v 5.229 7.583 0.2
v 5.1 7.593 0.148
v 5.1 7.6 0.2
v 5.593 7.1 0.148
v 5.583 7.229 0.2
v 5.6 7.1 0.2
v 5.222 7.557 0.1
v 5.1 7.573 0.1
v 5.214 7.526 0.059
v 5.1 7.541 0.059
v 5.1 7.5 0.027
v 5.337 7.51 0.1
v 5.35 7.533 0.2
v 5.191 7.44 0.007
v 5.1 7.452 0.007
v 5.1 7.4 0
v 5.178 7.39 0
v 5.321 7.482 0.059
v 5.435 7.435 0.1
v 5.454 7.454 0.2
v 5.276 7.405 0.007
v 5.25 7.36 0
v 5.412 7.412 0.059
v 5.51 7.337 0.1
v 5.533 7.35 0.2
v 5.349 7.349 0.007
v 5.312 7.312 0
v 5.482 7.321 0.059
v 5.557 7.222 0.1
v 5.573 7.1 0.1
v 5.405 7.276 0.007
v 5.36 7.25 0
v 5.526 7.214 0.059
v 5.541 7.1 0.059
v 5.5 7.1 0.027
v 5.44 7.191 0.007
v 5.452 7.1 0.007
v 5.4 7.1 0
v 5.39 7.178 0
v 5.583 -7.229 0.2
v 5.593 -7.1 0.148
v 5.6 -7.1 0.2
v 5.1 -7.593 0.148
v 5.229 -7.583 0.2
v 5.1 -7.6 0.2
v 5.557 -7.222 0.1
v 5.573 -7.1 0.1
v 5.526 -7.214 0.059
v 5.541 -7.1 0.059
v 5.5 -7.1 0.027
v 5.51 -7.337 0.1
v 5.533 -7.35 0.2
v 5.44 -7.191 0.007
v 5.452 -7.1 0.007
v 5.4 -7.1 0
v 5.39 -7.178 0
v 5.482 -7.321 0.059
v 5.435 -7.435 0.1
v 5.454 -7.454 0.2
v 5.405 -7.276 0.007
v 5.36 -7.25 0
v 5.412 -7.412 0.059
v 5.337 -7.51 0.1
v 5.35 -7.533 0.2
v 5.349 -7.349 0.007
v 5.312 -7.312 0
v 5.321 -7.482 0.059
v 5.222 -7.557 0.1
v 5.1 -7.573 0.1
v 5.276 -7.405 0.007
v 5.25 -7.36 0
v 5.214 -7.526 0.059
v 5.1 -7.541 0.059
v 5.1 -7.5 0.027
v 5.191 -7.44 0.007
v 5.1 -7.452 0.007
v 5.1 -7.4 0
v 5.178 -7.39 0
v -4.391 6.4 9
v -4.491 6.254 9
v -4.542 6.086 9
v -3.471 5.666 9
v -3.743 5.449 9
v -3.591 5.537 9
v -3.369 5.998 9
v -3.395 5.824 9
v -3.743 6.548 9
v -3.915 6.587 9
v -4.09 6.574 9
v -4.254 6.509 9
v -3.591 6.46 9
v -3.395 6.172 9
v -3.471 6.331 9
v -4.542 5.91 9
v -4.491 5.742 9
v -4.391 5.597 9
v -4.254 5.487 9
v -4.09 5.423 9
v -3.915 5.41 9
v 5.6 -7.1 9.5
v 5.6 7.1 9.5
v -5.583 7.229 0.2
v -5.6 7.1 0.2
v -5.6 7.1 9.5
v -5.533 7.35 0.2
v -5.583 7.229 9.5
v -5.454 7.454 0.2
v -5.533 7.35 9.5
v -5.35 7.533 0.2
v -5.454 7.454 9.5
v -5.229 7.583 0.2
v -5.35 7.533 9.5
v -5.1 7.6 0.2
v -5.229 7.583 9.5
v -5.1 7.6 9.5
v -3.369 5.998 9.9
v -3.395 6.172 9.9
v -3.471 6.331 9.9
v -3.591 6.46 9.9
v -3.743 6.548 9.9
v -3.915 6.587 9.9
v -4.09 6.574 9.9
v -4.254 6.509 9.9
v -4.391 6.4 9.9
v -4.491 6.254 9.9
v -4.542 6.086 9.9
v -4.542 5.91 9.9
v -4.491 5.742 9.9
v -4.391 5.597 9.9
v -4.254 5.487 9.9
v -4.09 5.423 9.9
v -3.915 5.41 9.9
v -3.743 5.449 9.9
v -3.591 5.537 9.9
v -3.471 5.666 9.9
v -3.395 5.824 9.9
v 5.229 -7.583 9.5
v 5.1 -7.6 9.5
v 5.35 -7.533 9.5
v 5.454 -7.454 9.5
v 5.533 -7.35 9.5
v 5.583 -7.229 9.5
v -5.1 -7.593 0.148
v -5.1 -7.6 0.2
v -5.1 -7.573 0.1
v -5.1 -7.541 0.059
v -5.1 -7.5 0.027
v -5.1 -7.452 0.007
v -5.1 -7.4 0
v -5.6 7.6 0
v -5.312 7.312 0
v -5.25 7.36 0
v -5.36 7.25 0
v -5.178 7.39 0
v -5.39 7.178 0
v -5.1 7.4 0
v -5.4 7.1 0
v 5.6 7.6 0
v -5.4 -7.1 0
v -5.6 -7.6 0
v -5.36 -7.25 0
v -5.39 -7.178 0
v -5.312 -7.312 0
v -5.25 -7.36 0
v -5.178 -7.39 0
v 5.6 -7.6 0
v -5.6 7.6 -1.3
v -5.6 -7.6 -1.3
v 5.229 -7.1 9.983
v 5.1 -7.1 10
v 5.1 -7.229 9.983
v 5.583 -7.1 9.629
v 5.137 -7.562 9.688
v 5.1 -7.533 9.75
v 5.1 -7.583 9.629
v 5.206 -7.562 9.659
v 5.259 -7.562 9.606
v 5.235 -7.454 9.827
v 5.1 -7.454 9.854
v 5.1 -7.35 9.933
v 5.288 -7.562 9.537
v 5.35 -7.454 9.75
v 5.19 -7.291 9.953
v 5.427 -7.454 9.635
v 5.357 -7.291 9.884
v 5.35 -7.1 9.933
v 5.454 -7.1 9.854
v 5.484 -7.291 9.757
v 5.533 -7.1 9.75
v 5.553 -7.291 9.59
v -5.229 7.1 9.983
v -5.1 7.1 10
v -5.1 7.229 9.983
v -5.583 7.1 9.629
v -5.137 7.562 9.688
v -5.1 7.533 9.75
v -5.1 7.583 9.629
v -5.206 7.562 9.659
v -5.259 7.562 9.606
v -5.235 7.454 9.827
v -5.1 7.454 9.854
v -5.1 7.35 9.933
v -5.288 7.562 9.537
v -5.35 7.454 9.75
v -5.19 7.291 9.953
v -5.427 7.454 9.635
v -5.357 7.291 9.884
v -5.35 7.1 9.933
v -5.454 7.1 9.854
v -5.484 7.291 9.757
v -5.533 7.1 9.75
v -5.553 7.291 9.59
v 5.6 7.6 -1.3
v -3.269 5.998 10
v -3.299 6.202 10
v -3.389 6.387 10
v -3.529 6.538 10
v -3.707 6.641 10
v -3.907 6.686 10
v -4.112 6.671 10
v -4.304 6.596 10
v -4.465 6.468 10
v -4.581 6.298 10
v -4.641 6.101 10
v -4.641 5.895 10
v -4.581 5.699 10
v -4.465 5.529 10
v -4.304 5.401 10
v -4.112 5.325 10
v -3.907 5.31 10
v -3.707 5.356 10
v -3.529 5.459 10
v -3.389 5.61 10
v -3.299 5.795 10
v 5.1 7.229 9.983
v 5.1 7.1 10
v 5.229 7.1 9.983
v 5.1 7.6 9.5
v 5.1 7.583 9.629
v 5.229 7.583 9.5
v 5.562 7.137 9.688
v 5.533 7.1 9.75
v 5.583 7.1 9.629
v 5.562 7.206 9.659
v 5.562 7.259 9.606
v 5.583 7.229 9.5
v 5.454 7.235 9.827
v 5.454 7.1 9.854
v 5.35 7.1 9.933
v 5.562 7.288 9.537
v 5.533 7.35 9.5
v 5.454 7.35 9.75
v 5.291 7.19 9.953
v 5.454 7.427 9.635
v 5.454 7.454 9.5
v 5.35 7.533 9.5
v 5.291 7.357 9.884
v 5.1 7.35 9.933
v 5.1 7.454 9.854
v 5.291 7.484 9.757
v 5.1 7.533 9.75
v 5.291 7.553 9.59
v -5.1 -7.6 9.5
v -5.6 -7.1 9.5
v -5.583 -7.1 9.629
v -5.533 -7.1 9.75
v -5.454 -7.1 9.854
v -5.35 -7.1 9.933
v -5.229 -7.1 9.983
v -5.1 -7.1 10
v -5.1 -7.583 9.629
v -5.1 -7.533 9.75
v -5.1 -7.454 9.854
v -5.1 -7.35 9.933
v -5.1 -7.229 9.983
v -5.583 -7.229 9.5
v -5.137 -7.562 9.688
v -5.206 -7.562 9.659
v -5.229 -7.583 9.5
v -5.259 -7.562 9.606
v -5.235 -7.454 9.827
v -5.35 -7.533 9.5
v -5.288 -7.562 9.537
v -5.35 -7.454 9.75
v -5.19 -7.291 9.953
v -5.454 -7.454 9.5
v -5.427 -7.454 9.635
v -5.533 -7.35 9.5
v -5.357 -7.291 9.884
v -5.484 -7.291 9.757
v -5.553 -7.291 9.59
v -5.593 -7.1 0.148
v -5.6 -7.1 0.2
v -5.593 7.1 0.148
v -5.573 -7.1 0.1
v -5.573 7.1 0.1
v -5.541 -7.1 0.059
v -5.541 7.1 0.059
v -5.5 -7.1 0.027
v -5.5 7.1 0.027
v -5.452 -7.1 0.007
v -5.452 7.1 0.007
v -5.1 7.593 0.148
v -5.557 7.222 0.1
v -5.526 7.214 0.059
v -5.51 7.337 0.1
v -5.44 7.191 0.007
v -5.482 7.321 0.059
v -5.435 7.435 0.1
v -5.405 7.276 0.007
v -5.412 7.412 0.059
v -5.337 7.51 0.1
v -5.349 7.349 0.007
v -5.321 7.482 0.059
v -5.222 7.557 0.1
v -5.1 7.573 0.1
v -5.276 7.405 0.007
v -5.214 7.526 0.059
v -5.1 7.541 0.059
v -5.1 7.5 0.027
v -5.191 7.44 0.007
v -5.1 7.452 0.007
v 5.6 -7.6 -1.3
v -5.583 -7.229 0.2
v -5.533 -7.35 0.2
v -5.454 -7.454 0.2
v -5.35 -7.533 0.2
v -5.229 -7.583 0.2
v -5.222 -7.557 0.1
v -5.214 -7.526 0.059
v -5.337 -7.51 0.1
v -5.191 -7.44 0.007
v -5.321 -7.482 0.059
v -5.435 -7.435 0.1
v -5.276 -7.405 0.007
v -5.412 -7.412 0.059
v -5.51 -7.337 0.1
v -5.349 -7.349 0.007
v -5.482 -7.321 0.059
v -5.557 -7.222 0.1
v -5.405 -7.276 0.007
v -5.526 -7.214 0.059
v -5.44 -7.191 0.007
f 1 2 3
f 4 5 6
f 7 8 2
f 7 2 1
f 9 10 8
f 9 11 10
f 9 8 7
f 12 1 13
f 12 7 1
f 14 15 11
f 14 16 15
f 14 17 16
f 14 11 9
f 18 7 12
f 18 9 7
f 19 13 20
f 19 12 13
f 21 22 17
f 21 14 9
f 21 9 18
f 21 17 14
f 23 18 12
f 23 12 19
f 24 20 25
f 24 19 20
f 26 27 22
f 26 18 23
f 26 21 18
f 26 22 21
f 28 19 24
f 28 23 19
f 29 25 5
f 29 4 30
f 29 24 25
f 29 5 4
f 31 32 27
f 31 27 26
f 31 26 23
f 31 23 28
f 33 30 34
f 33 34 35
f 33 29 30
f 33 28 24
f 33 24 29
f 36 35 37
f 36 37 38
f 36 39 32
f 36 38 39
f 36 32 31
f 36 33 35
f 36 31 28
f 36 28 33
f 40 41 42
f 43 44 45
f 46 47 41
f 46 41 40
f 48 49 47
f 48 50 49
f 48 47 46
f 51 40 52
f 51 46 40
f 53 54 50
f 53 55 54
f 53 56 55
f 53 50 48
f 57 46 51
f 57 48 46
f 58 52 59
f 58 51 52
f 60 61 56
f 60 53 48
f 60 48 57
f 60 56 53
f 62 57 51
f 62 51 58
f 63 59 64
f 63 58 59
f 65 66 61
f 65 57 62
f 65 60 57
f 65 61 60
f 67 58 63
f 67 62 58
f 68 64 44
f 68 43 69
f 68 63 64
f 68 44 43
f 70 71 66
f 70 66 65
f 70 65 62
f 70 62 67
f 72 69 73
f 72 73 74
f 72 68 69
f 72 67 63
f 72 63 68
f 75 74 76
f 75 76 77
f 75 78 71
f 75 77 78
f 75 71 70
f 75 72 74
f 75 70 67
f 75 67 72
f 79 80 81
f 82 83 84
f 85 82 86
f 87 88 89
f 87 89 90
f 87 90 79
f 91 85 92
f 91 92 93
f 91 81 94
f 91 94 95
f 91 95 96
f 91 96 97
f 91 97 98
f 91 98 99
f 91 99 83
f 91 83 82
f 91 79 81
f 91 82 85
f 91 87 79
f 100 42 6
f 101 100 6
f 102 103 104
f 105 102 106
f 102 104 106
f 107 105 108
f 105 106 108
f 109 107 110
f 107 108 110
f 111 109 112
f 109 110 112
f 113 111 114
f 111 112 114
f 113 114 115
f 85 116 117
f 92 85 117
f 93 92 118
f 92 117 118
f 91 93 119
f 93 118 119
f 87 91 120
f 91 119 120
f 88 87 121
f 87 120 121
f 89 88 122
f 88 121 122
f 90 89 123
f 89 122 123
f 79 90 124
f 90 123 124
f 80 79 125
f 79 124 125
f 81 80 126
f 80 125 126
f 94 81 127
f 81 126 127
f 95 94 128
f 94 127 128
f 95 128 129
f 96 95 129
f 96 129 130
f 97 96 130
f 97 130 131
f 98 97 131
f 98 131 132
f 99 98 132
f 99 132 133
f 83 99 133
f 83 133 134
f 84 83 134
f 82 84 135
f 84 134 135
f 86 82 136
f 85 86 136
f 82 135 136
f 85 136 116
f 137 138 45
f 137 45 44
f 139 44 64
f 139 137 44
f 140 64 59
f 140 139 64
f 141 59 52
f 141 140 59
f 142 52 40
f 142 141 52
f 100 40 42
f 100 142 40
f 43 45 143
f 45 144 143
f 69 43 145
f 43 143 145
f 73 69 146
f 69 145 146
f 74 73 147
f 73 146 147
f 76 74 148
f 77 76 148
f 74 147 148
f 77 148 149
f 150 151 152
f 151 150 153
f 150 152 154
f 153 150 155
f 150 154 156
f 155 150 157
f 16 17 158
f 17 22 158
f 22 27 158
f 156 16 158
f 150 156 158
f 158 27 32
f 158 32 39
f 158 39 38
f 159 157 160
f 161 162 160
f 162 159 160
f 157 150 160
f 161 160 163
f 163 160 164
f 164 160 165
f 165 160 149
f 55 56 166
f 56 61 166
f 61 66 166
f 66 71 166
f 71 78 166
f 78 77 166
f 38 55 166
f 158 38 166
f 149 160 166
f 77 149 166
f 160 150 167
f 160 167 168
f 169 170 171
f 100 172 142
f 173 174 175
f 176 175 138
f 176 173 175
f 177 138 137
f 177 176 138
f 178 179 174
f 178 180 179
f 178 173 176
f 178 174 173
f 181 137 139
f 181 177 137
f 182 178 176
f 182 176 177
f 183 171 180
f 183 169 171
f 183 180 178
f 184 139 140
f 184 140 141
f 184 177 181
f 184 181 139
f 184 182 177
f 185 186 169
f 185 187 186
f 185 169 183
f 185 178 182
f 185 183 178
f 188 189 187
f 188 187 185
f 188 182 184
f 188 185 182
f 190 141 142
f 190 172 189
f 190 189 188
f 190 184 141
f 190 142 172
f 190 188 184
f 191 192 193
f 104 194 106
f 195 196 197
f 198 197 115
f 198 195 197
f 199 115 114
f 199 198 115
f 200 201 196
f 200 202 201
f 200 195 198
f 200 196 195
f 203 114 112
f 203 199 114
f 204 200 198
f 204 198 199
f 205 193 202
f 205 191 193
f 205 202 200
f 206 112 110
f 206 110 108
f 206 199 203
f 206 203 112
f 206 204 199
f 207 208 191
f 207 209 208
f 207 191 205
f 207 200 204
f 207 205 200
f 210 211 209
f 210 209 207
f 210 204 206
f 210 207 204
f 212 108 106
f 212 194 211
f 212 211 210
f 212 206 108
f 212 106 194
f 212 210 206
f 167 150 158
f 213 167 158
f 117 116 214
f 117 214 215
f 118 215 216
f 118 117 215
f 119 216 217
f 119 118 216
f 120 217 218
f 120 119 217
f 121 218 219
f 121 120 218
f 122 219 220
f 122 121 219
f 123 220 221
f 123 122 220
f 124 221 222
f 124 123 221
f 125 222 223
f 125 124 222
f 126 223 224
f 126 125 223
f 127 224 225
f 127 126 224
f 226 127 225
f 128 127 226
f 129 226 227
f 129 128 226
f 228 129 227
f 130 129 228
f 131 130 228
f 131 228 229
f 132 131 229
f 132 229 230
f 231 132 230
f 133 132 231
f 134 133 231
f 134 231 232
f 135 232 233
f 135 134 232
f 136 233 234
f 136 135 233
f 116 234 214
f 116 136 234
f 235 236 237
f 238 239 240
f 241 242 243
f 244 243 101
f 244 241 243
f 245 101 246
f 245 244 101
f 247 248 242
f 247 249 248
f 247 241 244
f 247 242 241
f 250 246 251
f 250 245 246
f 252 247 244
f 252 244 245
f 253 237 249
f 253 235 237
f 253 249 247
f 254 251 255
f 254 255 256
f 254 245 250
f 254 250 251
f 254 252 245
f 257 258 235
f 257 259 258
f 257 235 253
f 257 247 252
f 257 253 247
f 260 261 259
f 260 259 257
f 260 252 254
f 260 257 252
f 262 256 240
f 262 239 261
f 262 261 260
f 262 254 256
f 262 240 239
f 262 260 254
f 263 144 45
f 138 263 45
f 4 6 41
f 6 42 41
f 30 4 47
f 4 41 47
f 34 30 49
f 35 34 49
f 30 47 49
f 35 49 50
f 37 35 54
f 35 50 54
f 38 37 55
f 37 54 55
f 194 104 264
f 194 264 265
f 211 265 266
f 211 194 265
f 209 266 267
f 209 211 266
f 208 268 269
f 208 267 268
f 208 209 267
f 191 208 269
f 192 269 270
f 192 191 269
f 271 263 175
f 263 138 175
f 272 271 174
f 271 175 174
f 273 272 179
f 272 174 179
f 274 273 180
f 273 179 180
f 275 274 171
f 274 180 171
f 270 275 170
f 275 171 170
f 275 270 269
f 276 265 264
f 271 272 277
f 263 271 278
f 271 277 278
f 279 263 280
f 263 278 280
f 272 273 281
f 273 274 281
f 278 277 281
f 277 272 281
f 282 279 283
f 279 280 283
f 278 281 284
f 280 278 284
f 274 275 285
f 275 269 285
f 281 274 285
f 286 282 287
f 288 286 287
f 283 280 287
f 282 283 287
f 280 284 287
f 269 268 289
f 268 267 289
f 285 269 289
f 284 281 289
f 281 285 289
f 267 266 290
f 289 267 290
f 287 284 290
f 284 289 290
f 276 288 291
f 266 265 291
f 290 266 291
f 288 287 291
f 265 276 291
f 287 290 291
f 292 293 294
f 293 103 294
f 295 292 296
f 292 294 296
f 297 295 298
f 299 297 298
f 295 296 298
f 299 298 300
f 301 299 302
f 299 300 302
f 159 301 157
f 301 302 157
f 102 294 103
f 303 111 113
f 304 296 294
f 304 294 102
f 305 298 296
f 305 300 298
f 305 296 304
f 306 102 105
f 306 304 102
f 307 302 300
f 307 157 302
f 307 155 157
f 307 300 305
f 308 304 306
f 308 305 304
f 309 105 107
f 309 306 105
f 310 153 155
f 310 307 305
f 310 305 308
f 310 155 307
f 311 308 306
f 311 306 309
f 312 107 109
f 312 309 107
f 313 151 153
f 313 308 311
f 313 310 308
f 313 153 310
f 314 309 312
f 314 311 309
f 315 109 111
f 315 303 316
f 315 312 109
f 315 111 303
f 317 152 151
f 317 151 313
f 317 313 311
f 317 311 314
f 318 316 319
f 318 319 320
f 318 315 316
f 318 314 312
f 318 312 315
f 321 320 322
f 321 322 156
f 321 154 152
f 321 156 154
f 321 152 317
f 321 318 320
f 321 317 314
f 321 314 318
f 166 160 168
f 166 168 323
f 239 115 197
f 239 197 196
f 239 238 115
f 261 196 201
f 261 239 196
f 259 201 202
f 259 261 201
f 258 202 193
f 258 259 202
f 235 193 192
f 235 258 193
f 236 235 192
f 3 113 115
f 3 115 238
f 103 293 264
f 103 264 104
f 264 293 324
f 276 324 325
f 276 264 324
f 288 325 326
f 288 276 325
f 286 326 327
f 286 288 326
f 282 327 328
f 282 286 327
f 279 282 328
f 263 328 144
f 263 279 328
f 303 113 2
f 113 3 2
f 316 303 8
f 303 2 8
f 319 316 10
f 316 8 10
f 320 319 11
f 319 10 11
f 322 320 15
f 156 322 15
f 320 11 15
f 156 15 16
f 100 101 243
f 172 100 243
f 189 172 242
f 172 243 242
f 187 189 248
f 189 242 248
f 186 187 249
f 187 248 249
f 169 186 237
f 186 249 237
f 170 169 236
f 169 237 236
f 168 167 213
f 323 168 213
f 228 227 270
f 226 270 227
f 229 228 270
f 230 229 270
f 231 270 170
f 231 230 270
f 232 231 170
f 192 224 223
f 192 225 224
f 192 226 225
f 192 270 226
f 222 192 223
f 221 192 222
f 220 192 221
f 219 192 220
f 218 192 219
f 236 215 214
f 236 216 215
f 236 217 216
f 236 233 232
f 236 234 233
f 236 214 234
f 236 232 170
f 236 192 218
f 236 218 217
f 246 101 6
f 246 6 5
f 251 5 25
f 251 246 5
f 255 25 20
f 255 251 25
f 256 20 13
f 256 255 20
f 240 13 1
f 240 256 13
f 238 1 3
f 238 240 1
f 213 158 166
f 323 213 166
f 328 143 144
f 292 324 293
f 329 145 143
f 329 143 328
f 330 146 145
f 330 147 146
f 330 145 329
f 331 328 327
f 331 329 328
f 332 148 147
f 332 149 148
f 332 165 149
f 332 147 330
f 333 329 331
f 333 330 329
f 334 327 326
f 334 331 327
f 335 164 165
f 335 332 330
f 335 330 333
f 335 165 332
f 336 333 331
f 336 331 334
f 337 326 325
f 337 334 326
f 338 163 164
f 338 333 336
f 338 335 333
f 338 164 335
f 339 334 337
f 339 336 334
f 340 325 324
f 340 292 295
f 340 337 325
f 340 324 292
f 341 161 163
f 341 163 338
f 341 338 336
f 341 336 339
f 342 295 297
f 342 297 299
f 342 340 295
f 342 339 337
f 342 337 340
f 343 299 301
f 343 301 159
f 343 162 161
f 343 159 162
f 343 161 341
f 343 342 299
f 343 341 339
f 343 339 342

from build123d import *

# Parameters (mm, degrees)
SKETCH_W     = 11.2
SKETCH_H     = 15.2
PAD_DEPTH    = 10
FILLET_R     = 0.5
FILLET001_R  = 0.2
SKETCH002_R  = 0.590091
POCKET_DEPTH = 1
SKETCH001_W  = 11.2
SKETCH001_H  = 15.2
PAD001_DEPTH = 1.3
CHAMFER_SIZE = 0.1


with BuildPart() as part:
    # Sketch → Pad (new body)
    with BuildSketch(Plane.XY):
        Rectangle(SKETCH_W, SKETCH_H)
    extrude(amount=PAD_DEPTH)

    # Fillet
    fillet_edges = [part.edges().sort_by_distance(p)[0] for p in [
        (-5.6, 0, 10),
        (0, 7.6, 10),
        (5.6, 0, 10),
        (0, -7.6, 10),
        (5.6, -7.6, 5),
        (5.6, 7.6, 5),
        (-5.6, 7.6, 5),
        (-5.6, -7.6, 5),
    ]]
    fillet(fillet_edges, radius=FILLET_R)

    # Fillet001
    fillet001_edges = [part.edges().sort_by_distance(p)[0] for p in [
        (-5.6, 0, 0),
        (-5.453553, -7.453553, 0),
        (-5.453553, 7.453553, 0),
        (0, -7.6, 0),
        (0, 7.6, 0),
        (5.453553, -7.453553, 0),
        (5.453553, 7.453553, 0),
        (5.6, 0, 0),
    ]]
    fillet(fillet001_edges, radius=FILLET001_R)

    # Sketch002 (on Face12 of Fillet001) → Pocket (cut)
    with BuildSketch(Plane.XY.offset(10)):
        with Locations((-3.95892, 5.998271)):
            Circle(SKETCH002_R)
    extrude(amount=-POCKET_DEPTH, mode=Mode.SUBTRACT)

    # Sketch001 (on Face9 of Fillet001) → Pad001 (join)
    with BuildSketch(Plane(origin=(0, 0, 0), x_dir=(1, 0, 0), z_dir=(0, 0, -1))):
        Rectangle(SKETCH001_W, SKETCH001_H)
    extrude(amount=PAD001_DEPTH)

    # Chamfer
    chamfer_edges = [part.edges().sort_by_distance(p)[0] for p in [
        (-4.549011, 5.998271, 10),
    ]]
    chamfer(chamfer_edges, length=CHAMFER_SIZE)


solid = part.part
